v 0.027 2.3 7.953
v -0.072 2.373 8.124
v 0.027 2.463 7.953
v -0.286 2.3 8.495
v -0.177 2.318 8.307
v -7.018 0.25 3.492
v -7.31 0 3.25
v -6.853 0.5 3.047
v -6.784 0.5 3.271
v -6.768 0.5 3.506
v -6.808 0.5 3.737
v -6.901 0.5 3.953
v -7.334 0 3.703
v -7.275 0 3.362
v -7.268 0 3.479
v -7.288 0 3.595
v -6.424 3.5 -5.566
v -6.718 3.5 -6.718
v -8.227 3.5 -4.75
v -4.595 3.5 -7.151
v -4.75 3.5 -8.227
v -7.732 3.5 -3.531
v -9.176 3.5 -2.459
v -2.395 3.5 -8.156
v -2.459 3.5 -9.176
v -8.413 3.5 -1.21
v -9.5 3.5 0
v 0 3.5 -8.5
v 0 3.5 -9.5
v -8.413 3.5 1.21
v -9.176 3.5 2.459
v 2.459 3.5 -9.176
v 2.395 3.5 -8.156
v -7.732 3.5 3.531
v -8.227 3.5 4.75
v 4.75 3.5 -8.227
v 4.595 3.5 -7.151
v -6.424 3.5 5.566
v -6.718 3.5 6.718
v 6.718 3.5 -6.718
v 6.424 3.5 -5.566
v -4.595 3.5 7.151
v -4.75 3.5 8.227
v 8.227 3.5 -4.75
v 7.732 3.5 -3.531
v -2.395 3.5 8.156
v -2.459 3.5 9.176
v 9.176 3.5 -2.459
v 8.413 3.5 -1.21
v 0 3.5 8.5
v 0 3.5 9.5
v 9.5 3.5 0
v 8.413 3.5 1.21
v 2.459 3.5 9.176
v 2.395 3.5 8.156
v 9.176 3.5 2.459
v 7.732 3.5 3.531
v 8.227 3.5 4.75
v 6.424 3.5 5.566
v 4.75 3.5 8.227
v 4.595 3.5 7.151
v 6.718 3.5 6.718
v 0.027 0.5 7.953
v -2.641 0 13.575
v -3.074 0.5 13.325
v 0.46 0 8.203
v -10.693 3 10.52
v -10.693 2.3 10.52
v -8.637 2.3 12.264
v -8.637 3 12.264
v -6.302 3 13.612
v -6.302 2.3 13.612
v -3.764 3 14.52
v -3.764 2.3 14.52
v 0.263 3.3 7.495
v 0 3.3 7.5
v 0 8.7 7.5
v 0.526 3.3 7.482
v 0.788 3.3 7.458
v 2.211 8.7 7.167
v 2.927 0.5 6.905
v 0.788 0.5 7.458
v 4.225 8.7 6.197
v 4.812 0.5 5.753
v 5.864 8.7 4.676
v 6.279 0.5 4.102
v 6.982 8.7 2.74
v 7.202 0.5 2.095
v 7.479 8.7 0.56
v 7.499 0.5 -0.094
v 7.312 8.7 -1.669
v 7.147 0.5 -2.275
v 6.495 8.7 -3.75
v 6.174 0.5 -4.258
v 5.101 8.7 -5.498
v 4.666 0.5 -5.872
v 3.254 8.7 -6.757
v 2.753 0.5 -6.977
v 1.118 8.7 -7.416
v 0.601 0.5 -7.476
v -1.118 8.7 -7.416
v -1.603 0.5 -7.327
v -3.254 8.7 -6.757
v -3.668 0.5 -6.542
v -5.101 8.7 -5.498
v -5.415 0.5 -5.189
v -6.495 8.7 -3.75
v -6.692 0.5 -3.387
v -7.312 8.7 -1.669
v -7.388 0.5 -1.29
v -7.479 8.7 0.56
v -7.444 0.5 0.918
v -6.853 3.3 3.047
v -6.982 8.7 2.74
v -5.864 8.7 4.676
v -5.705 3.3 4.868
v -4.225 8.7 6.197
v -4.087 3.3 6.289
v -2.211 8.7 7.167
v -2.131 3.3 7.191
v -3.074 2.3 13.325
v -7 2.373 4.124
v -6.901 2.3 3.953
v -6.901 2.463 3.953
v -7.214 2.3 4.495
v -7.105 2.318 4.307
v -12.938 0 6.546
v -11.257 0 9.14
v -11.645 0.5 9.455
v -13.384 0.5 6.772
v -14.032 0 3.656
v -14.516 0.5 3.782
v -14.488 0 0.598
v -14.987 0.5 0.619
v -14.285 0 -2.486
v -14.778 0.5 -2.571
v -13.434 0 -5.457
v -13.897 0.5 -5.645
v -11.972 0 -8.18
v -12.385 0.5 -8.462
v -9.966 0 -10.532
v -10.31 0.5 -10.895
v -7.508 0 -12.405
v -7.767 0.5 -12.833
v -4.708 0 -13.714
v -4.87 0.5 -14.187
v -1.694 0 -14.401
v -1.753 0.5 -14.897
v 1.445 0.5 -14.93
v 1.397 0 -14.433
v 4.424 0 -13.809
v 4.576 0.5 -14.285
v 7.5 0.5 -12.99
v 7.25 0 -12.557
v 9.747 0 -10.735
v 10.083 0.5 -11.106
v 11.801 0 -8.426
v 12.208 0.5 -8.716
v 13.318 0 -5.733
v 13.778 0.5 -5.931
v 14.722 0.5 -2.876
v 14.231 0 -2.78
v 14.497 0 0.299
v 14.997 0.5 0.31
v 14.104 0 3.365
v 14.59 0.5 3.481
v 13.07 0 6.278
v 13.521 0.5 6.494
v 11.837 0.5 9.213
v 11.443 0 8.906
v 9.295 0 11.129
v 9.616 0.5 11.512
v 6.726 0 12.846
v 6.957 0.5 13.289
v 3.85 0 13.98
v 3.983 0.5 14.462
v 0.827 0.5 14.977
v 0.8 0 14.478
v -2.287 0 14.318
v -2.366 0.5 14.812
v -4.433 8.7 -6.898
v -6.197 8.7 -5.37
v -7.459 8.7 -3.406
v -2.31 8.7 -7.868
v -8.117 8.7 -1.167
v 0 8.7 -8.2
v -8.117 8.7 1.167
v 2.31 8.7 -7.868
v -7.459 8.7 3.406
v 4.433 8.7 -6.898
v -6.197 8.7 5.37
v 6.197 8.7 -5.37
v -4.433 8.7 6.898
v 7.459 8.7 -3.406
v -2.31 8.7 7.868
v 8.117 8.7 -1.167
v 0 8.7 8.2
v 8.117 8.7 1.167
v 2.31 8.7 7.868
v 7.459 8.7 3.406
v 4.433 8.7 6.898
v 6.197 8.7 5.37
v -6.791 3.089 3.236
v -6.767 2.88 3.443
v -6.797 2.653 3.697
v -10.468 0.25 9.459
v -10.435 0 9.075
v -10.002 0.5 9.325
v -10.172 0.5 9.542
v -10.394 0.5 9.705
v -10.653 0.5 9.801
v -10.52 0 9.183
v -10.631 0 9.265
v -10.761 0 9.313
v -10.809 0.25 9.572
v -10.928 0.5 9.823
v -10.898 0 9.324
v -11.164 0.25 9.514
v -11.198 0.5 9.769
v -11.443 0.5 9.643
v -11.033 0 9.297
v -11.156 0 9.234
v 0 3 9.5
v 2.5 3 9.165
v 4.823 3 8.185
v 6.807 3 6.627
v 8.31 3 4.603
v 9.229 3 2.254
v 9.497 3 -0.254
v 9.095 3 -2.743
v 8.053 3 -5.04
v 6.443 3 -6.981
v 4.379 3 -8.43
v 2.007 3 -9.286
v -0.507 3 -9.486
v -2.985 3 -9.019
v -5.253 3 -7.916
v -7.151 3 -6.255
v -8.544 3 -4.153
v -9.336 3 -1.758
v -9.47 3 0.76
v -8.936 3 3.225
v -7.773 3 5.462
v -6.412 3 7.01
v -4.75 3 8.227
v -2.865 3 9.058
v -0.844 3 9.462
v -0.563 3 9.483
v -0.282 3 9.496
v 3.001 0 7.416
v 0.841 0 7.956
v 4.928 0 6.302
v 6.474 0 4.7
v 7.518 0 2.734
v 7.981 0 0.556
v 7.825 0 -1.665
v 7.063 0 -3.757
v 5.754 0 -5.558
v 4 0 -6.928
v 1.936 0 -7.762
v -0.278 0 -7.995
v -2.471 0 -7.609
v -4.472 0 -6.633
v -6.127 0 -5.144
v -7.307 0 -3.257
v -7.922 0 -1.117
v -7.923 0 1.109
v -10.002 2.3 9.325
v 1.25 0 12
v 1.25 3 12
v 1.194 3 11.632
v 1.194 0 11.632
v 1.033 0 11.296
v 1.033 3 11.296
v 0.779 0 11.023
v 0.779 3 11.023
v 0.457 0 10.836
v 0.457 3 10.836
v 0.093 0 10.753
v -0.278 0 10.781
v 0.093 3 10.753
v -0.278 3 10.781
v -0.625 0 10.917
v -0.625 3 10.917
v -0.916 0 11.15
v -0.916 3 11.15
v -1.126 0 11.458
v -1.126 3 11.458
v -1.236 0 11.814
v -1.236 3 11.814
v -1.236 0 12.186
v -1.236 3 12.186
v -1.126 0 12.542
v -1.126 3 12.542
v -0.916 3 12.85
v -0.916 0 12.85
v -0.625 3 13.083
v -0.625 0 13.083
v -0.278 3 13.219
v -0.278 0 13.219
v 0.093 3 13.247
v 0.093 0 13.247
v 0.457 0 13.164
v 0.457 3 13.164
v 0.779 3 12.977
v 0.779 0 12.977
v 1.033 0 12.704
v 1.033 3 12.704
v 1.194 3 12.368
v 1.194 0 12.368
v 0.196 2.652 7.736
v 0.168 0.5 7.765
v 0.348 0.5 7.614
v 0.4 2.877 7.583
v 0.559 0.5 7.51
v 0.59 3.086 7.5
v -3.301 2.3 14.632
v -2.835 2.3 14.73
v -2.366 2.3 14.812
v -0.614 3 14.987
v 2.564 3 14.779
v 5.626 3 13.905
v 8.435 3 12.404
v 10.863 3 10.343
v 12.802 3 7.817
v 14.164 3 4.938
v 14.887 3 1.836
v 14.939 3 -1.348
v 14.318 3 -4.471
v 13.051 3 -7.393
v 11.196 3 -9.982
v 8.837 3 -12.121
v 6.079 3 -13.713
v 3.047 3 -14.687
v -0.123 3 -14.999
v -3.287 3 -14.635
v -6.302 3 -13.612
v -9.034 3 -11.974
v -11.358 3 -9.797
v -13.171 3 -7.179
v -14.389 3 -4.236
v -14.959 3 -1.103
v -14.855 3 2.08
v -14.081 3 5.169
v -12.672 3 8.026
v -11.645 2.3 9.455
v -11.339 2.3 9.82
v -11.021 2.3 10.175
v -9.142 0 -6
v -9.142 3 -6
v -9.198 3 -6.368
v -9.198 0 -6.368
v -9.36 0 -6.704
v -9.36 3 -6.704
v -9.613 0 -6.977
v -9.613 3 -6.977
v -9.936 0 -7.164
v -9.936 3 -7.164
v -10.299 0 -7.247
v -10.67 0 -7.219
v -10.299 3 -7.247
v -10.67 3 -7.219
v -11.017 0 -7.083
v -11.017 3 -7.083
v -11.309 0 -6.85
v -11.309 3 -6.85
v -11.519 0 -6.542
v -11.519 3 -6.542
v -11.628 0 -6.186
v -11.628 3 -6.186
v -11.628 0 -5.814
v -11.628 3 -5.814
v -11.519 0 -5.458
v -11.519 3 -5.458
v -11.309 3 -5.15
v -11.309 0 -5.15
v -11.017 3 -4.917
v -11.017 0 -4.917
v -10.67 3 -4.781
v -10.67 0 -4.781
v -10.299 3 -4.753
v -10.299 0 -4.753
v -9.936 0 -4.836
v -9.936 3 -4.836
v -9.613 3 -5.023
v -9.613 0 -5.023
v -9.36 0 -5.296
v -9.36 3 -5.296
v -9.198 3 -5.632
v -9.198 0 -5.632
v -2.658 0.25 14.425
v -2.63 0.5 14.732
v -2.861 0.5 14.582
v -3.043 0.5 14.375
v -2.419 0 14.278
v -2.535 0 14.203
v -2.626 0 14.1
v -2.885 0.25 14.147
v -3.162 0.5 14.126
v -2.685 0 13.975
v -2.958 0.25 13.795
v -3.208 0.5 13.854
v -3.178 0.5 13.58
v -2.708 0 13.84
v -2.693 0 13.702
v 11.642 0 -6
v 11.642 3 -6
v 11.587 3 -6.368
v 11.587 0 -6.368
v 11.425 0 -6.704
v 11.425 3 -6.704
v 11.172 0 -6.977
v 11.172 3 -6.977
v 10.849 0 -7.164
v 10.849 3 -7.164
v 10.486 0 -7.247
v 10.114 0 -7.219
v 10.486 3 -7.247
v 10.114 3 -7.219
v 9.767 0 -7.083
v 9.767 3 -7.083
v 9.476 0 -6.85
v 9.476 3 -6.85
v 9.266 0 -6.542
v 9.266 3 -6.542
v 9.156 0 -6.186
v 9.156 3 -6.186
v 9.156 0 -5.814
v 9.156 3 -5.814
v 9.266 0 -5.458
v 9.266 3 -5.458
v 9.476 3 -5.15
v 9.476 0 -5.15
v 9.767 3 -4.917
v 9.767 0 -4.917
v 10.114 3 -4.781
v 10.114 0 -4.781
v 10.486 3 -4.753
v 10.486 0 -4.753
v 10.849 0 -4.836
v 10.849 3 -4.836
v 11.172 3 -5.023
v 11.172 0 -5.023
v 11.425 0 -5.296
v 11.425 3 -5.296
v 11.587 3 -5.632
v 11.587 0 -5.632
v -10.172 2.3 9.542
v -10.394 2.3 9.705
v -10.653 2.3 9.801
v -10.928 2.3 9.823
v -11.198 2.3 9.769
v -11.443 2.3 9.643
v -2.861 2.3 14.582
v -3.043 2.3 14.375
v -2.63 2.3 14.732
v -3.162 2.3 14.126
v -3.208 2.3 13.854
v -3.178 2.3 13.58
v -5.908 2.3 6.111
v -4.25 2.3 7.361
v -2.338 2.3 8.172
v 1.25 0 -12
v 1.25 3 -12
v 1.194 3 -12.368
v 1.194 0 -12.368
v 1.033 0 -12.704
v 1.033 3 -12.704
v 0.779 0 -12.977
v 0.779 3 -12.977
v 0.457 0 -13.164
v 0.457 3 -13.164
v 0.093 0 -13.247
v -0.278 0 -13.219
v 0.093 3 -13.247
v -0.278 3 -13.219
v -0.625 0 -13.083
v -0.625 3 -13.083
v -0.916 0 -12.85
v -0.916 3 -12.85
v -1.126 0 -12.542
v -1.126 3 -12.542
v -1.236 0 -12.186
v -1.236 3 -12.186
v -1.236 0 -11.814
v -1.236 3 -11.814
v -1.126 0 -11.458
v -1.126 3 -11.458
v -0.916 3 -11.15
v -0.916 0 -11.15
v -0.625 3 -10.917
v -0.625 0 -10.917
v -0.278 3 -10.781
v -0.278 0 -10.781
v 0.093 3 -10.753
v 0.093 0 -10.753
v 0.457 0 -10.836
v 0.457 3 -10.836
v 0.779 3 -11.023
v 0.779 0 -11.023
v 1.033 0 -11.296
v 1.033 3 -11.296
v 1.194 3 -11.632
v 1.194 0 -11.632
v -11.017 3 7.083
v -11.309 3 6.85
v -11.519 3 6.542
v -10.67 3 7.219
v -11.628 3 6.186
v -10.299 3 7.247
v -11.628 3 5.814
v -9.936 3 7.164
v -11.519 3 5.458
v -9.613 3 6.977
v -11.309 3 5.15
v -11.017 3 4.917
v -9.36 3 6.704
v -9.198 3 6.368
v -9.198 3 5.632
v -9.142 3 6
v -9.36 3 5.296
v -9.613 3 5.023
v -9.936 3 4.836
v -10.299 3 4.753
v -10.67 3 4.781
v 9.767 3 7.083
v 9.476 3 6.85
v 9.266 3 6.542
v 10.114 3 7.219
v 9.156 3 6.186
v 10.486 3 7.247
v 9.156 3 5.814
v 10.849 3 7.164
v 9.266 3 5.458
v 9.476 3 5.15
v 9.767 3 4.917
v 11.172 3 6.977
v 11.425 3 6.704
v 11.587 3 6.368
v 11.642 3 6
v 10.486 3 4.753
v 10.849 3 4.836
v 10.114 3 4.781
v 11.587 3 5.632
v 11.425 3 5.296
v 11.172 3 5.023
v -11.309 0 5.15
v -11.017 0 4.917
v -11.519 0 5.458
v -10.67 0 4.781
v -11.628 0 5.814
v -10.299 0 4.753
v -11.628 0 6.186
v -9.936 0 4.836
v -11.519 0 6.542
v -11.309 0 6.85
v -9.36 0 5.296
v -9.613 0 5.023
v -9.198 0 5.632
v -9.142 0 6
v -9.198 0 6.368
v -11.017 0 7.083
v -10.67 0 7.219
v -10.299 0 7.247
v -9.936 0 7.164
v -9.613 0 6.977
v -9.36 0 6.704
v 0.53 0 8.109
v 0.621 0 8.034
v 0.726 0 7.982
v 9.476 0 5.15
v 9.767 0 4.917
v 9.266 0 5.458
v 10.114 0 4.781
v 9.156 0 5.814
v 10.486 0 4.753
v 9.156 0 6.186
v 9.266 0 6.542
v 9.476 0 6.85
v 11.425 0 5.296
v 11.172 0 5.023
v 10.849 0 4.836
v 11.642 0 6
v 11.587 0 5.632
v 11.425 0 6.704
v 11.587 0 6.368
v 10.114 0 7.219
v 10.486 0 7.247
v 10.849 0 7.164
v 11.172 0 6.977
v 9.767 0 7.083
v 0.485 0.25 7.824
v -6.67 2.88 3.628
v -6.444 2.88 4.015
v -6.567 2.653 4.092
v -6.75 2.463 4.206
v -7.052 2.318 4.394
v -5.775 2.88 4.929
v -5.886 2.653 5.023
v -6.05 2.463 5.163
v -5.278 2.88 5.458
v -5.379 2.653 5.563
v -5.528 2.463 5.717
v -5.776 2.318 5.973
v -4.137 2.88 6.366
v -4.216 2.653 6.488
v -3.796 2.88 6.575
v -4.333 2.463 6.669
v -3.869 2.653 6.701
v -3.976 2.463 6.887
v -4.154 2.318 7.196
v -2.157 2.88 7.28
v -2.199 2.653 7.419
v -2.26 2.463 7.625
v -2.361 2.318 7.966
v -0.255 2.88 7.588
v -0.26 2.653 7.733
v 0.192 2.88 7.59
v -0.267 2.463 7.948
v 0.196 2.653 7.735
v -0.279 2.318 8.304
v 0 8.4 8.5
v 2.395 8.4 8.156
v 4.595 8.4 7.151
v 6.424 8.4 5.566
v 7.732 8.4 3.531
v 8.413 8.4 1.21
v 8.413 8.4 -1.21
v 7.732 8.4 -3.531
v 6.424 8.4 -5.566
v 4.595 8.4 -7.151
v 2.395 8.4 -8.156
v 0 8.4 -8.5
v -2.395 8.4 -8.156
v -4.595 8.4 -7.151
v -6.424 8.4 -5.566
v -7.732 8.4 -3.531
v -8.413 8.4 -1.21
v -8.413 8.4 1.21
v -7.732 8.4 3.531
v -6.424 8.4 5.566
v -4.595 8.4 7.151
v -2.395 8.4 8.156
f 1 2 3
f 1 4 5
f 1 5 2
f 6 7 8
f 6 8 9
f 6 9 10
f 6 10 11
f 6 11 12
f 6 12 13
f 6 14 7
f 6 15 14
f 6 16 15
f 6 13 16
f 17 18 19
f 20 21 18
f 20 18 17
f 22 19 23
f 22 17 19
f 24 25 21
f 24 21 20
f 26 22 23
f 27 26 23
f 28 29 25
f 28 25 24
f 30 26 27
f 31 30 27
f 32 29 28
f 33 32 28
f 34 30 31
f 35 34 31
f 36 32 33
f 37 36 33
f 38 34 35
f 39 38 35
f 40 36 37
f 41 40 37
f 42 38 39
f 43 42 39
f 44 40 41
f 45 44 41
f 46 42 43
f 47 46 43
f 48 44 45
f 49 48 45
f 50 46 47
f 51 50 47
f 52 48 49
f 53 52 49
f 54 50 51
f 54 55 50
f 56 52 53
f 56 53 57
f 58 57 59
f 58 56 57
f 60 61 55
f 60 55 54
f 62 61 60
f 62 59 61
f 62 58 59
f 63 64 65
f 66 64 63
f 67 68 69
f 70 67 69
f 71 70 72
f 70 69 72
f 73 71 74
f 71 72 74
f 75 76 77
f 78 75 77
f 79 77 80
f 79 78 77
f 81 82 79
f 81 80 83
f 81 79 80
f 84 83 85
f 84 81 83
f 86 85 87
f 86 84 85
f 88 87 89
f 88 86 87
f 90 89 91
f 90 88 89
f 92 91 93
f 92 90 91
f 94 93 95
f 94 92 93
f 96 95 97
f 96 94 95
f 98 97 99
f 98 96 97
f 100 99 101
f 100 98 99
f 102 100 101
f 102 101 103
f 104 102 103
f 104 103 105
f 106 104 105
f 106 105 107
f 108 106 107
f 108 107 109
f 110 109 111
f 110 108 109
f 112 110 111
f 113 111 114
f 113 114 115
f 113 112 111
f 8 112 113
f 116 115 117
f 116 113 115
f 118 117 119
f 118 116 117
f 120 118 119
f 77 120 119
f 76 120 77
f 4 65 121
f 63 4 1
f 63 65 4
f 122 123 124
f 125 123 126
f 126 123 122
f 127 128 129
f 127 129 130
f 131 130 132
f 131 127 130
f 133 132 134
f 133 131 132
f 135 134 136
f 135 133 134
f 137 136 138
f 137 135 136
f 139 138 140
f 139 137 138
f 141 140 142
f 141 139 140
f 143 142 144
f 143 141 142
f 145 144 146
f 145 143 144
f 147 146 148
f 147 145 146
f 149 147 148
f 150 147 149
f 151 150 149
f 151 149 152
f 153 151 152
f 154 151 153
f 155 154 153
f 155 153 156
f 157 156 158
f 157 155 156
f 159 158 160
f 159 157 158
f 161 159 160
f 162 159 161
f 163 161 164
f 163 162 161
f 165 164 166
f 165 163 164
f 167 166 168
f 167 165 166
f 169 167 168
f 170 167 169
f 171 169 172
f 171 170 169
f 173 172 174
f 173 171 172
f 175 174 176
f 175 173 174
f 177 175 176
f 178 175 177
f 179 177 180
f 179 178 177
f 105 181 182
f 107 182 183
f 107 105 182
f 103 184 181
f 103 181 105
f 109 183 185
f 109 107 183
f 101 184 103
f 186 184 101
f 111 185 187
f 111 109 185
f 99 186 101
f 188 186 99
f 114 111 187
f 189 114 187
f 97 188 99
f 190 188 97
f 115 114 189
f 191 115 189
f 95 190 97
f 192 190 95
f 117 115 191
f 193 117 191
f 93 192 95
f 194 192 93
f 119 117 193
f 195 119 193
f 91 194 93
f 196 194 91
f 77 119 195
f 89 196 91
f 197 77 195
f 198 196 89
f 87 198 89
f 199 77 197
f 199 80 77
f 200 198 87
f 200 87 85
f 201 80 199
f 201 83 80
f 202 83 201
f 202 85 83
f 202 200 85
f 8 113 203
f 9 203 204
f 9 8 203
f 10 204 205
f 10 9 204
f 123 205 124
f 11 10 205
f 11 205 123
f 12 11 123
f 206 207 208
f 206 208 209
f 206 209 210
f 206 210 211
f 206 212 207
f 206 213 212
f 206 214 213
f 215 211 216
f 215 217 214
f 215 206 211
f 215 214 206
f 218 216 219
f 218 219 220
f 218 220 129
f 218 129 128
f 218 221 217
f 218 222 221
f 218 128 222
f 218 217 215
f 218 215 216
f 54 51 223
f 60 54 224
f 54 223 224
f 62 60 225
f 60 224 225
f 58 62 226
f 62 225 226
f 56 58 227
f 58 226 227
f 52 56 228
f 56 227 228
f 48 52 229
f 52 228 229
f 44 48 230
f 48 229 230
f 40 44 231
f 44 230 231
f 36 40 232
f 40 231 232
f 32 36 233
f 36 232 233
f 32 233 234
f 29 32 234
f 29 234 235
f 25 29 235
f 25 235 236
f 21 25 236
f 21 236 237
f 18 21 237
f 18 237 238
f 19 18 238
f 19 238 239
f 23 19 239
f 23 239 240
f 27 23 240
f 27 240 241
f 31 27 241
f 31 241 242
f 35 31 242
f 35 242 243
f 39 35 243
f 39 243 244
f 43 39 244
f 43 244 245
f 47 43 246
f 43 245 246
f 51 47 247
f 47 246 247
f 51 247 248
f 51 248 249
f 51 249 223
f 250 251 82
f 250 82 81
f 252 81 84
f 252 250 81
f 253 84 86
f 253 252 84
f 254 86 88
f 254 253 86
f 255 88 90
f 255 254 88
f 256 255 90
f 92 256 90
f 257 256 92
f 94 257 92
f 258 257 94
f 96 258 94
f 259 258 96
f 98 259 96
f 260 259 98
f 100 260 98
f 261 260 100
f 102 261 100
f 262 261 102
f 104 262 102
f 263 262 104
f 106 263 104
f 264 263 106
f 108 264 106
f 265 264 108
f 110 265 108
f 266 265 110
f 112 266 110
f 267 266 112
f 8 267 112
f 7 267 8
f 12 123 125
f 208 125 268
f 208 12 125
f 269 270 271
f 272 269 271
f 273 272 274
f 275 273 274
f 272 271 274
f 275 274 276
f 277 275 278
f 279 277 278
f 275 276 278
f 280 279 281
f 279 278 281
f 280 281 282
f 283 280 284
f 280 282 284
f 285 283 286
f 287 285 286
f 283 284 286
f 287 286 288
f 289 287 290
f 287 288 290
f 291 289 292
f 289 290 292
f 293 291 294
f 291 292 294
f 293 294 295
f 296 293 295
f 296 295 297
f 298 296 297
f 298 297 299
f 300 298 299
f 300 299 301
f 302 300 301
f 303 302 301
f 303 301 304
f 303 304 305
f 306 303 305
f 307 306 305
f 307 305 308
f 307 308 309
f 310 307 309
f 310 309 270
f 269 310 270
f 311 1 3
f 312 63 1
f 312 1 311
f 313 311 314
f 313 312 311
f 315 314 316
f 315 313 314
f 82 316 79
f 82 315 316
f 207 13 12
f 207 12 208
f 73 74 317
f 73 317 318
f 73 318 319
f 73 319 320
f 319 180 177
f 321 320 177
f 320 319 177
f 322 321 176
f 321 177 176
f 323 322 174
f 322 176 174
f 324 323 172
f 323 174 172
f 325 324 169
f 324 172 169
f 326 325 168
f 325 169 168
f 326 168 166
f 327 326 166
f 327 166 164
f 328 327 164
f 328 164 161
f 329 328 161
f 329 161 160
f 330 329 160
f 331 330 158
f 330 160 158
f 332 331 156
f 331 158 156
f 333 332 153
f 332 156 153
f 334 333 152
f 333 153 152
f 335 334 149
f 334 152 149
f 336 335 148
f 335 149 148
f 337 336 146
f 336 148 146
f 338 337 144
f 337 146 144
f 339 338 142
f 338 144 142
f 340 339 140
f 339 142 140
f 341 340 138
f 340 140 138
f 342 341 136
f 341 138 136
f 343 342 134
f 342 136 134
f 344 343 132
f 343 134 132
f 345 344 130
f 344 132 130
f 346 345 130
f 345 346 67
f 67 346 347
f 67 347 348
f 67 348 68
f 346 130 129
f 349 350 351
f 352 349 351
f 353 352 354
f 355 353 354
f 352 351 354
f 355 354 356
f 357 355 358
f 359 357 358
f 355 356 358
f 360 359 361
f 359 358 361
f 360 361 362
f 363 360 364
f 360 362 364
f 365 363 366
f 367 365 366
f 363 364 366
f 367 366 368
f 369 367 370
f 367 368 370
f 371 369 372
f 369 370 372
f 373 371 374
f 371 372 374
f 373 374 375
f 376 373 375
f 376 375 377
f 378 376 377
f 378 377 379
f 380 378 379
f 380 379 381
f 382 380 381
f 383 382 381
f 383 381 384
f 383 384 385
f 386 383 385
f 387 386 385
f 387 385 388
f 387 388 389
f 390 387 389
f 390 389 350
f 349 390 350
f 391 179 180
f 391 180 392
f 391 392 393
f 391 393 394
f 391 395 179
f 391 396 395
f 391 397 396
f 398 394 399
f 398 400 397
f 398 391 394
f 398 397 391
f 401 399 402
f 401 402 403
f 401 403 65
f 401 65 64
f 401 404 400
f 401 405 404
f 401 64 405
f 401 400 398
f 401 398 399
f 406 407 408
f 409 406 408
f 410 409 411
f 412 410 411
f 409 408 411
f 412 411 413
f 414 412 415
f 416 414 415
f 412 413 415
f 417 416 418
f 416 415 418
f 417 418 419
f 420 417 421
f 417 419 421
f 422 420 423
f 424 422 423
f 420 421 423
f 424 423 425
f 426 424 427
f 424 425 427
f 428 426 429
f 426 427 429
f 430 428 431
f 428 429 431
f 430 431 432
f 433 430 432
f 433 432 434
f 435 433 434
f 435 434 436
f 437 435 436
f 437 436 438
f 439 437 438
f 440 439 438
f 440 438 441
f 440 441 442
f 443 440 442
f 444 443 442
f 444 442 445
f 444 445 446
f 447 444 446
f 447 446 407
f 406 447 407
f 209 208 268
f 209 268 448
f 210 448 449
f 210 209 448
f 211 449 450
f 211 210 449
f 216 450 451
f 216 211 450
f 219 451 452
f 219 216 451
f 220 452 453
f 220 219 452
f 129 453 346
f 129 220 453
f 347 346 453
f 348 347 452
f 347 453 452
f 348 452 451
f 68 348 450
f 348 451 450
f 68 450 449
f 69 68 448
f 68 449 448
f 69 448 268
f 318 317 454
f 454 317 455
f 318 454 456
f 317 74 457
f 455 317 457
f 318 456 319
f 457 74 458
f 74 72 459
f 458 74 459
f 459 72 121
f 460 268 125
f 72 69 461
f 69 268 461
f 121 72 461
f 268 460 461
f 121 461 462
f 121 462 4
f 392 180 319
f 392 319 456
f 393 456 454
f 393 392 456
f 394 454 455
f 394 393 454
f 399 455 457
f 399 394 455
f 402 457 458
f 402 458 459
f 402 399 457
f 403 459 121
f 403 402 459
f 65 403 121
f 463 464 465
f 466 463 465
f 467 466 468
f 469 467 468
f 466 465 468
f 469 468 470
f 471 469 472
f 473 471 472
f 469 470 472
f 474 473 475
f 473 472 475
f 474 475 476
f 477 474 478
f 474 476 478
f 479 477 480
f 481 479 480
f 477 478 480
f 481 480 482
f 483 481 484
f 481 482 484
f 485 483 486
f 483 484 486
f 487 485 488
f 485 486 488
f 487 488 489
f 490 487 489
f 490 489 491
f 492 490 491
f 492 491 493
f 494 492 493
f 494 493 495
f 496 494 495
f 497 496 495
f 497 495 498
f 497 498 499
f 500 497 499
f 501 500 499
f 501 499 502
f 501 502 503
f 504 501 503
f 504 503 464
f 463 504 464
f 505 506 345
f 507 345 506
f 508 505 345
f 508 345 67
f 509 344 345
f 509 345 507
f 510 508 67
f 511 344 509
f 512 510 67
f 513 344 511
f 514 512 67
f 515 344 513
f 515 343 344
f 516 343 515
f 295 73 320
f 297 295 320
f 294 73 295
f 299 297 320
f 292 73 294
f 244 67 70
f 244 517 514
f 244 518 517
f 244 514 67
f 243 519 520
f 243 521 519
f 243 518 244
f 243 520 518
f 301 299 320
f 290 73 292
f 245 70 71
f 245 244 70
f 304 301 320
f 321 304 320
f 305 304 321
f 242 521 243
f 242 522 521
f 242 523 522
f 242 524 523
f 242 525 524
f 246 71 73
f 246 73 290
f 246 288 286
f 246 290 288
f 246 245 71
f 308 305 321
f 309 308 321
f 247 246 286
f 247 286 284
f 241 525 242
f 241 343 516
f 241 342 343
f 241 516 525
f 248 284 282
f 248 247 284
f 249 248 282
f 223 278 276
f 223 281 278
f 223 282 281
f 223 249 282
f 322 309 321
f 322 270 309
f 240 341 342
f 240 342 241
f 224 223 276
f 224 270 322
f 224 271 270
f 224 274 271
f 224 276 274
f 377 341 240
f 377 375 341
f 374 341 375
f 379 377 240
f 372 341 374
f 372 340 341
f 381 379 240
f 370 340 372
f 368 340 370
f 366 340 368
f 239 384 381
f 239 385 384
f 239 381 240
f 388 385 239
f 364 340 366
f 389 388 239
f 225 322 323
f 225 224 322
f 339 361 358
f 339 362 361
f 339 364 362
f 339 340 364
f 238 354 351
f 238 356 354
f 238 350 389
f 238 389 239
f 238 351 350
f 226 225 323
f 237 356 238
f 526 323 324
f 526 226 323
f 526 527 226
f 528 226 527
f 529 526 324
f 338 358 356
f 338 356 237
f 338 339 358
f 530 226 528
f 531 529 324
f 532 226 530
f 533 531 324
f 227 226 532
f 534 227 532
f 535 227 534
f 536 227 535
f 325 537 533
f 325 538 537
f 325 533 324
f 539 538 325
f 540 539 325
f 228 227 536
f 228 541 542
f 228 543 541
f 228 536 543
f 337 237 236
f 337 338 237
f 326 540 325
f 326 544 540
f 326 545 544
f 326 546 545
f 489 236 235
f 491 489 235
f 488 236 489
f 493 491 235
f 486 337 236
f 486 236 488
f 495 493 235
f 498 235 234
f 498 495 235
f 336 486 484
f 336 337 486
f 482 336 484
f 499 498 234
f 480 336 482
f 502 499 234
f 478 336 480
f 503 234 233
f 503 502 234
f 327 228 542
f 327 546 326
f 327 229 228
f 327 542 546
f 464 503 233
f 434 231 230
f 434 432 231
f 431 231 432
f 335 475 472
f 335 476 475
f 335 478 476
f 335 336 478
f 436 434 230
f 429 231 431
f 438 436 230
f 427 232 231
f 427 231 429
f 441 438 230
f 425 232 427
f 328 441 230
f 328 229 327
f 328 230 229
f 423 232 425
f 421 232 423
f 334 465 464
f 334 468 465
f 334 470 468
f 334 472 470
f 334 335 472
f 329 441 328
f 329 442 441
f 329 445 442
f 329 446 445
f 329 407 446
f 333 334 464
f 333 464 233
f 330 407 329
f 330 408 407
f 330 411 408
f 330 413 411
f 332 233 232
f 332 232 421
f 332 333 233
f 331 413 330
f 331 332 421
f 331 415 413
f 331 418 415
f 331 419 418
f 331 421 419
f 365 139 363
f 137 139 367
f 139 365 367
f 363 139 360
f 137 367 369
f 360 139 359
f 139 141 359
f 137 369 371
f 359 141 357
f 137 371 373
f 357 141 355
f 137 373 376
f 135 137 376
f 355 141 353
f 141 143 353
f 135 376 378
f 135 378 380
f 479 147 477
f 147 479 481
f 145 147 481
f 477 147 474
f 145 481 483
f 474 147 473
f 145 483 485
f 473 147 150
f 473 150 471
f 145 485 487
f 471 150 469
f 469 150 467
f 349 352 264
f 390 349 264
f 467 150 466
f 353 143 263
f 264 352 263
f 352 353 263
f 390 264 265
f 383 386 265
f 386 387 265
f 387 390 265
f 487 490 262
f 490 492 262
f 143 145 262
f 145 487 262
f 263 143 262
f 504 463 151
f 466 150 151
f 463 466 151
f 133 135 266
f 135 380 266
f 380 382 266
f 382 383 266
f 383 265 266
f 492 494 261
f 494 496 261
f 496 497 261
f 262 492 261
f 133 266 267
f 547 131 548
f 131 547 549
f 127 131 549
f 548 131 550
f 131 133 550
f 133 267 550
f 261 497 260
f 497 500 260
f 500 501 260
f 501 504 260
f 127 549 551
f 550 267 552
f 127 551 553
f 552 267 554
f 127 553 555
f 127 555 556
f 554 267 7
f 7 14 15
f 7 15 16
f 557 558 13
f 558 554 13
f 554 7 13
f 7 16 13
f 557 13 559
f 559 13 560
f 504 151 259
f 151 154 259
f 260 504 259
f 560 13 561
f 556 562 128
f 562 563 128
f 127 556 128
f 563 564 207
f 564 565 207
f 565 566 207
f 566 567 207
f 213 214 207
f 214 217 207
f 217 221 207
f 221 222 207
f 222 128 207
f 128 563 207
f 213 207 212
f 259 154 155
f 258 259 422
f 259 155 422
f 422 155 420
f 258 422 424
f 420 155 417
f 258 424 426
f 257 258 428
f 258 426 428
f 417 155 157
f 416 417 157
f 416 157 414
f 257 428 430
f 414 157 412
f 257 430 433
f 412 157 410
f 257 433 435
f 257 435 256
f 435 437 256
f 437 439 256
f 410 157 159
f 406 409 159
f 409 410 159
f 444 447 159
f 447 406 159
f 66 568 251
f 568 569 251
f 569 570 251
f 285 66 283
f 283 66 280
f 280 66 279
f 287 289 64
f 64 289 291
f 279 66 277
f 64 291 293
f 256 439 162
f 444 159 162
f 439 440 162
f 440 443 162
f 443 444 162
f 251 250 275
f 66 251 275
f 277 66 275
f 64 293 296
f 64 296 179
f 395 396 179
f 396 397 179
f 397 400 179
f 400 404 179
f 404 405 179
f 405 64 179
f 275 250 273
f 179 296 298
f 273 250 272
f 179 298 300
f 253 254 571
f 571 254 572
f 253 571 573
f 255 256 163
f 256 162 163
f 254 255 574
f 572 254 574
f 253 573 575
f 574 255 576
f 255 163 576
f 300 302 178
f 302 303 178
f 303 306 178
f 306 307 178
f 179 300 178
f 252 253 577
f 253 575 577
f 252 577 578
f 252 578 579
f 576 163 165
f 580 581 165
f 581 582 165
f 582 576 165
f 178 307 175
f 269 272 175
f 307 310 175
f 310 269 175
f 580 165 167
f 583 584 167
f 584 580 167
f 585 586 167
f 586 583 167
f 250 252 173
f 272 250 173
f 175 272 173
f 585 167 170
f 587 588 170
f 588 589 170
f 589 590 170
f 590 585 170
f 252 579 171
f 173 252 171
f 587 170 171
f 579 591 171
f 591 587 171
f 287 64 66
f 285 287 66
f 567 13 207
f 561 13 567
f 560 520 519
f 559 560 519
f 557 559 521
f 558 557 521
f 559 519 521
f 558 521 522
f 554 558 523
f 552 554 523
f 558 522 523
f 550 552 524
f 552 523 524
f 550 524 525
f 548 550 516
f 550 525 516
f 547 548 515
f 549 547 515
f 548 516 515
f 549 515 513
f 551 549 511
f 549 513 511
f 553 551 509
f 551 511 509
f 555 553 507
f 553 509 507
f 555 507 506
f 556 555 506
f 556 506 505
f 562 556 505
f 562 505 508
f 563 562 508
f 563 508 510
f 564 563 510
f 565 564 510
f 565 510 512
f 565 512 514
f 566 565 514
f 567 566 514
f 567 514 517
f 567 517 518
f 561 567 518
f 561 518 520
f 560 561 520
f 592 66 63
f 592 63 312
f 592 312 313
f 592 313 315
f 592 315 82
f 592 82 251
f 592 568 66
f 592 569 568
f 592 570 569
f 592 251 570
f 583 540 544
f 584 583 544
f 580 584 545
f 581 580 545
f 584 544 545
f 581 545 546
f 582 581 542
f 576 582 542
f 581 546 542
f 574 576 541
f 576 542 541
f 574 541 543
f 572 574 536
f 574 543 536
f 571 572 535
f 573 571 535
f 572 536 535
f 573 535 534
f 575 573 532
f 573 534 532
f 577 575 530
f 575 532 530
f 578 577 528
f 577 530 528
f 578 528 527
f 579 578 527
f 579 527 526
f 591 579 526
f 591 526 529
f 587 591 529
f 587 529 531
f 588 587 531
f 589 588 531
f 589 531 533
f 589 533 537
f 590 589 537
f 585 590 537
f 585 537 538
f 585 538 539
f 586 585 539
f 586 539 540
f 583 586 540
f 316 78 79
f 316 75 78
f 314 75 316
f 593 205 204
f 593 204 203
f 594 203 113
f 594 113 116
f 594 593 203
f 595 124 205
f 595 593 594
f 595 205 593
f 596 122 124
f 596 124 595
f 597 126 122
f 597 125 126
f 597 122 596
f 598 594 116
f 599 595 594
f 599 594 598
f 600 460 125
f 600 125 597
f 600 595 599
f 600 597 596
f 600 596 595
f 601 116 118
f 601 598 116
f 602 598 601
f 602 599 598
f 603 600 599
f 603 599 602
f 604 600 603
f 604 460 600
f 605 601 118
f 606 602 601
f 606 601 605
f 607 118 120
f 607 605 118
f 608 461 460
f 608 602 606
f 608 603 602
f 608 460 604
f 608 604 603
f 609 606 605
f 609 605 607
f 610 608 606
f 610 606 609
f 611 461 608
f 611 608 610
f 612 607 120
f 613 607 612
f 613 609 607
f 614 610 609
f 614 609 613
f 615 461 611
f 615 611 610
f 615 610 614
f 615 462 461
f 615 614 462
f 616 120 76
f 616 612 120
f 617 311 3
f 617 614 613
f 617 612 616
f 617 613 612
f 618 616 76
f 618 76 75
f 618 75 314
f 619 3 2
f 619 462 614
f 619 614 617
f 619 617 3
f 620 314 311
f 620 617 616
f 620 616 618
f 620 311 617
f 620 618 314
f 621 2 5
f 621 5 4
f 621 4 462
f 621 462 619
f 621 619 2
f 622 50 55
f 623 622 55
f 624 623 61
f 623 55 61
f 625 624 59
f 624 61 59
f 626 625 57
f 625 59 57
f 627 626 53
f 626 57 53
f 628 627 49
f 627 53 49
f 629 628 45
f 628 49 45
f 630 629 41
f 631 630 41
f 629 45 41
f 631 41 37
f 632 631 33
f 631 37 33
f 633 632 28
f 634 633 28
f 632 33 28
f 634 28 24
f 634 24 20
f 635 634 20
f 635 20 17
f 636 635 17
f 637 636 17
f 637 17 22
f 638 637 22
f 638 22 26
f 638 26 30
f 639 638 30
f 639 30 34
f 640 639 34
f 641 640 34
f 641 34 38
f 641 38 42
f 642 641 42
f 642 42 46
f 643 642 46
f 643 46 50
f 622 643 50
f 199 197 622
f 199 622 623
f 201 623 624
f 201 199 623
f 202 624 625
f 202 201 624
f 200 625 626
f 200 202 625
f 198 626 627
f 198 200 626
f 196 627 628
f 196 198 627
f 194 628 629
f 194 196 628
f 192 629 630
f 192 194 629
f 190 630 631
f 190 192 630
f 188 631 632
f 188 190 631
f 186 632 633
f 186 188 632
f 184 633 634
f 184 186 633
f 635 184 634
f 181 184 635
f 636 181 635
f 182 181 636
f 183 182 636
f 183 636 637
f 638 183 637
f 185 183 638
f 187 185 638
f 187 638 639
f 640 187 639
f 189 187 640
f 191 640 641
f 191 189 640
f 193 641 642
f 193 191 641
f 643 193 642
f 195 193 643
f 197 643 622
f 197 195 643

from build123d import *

# Parameters (mm, degrees)
SKETCH_1_R          = 15
SKETCH_1_R_2        = 7.5
SKETCH_1_R_3        = 1
EXTRUDE_1_DEPTH     = 3
SKETCH_2_R          = 8.5
SKETCH_2_R_2        = 7.5
EXTRUDE_2_DEPTH     = 5.7
SKETCH_3_R          = 9.5
SKETCH_3_R_2        = 8.5
EXTRUDE_3_DEPTH     = 0.5
HOLE_WIZARD_M3_1_D  = 2.5
CHAMFER_2_SIZE      = 0.3
CUT_EXTRUDE_2_DEPTH = 2.3
FILLET_2_R          = 1
CHAMFER_3_SIZE      = 0.5


with BuildPart() as part:
    # 草图1 → 凸台-拉伸1 (new body)
    with BuildSketch(Plane(origin=(0, 0, 0), x_dir=(1, 0, 0), z_dir=(0, 1, 0))):
        Circle(SKETCH_1_R)
        Circle(SKETCH_1_R_2, mode=Mode.SUBTRACT)
        with Locations((0, 12)):
            Circle(SKETCH_1_R_3, mode=Mode.SUBTRACT)
        with Locations((10.392304845, 6)):
            Circle(SKETCH_1_R_3, mode=Mode.SUBTRACT)
        with Locations((10.392304845, -6)):
            Circle(SKETCH_1_R_3, mode=Mode.SUBTRACT)
        with Locations((0, -12)):
            Circle(SKETCH_1_R_3, mode=Mode.SUBTRACT)
        with Locations((-10.392304845, -6)):
            Circle(SKETCH_1_R_3, mode=Mode.SUBTRACT)
        with Locations((-10.392304845, 6)):
            Circle(SKETCH_1_R_3, mode=Mode.SUBTRACT)
    extrude(amount=EXTRUDE_1_DEPTH)

    # 草图2 → 凸台-拉伸2 (add)
    with BuildSketch(Plane(origin=(0, 3, 0), x_dir=(1, 0, 0), z_dir=(0, 1, 0))):
        Circle(SKETCH_2_R)
        Circle(SKETCH_2_R_2, mode=Mode.SUBTRACT)
    extrude(amount=EXTRUDE_2_DEPTH)

    # 草图3 → 凸台-拉伸3 (add)
    with BuildSketch(Plane(origin=(0, 3, 0), x_dir=(1, 0, 0), z_dir=(0, 1, 0))):
        Circle(SKETCH_3_R)
        Circle(SKETCH_3_R_2, mode=Mode.SUBTRACT)
    extrude(amount=EXTRUDE_3_DEPTH)

    # M3 螺纹孔1 (through all)
    with Locations(Plane(origin=(0, 0, 0), x_dir=(-1, 0, 0), z_dir=(0, -1, 0))):
        with Locations((0, 12), (10.392304845, 6), (10.392304845, -6), (0, -12), (-10.392304845, -6), (-10.392304845, 6)):
            Hole(HOLE_WIZARD_M3_1_D / 2)

    # 倒角2
    chamfer_2_edges = [part.edges().sort_by_distance(p)[0] for p in [
        (-8.5, 8.7, 0),
    ]]
    chamfer(chamfer_2_edges, length=CHAMFER_2_SIZE)

    # 草图7 → 切除-拉伸2 (cut)
    with BuildSketch(Plane.XZ):
        with BuildLine():
            Line((-3.464101615, -2), (-12.464101615, 13.588457268))
            ThreePointArc((-12.464101615, 13.588457268), (-11, 19.052558883), (-5.535898385, 17.588457268))
            Line((-5.535898385, 17.588457268), (3.464101615, 2))
            ThreePointArc((3.464101615, 2), (2, -3.464101615), (-3.464101615, -2))
        make_face()
    extrude(amount=-CUT_EXTRUDE_2_DEPTH, mode=Mode.SUBTRACT)

    # 圆角2
    fillet_2_edges = [part.edges().sort_by_distance(p)[0] for p in [
        (-3.75, 2.3, 6.495190528),
        (0.29195723, 1.15, 7.494315244),
        (-6.636246, 1.15, 3.494315244),
        (-3.764314532, 1.15, 14.519984026),
        (-10.692517763, 1.15, 10.519984026),
    ]]
    fillet(fillet_2_edges, radius=FILLET_2_R)

    # 倒角3
    chamfer_3_edges = [part.edges().sort_by_distance(p)[0] for p in [
        (-1.557296735, 0, -7.336540525),
        (0.348322918, 0, 7.614421432),
        (-6.768443854, 0, 3.50555422),
        (-1.523538478, 0, 10.638846051),
        (-8.451741708, 0, 6.638846051),
        (-3.111088885, 0, 14.254670597),
        (-10.789362417, 0, 9.821617306),
        (-5.016376849, 0, -14.136334861),
    ]]
    chamfer(chamfer_3_edges, length=CHAMFER_3_SIZE)


solid = part.part
